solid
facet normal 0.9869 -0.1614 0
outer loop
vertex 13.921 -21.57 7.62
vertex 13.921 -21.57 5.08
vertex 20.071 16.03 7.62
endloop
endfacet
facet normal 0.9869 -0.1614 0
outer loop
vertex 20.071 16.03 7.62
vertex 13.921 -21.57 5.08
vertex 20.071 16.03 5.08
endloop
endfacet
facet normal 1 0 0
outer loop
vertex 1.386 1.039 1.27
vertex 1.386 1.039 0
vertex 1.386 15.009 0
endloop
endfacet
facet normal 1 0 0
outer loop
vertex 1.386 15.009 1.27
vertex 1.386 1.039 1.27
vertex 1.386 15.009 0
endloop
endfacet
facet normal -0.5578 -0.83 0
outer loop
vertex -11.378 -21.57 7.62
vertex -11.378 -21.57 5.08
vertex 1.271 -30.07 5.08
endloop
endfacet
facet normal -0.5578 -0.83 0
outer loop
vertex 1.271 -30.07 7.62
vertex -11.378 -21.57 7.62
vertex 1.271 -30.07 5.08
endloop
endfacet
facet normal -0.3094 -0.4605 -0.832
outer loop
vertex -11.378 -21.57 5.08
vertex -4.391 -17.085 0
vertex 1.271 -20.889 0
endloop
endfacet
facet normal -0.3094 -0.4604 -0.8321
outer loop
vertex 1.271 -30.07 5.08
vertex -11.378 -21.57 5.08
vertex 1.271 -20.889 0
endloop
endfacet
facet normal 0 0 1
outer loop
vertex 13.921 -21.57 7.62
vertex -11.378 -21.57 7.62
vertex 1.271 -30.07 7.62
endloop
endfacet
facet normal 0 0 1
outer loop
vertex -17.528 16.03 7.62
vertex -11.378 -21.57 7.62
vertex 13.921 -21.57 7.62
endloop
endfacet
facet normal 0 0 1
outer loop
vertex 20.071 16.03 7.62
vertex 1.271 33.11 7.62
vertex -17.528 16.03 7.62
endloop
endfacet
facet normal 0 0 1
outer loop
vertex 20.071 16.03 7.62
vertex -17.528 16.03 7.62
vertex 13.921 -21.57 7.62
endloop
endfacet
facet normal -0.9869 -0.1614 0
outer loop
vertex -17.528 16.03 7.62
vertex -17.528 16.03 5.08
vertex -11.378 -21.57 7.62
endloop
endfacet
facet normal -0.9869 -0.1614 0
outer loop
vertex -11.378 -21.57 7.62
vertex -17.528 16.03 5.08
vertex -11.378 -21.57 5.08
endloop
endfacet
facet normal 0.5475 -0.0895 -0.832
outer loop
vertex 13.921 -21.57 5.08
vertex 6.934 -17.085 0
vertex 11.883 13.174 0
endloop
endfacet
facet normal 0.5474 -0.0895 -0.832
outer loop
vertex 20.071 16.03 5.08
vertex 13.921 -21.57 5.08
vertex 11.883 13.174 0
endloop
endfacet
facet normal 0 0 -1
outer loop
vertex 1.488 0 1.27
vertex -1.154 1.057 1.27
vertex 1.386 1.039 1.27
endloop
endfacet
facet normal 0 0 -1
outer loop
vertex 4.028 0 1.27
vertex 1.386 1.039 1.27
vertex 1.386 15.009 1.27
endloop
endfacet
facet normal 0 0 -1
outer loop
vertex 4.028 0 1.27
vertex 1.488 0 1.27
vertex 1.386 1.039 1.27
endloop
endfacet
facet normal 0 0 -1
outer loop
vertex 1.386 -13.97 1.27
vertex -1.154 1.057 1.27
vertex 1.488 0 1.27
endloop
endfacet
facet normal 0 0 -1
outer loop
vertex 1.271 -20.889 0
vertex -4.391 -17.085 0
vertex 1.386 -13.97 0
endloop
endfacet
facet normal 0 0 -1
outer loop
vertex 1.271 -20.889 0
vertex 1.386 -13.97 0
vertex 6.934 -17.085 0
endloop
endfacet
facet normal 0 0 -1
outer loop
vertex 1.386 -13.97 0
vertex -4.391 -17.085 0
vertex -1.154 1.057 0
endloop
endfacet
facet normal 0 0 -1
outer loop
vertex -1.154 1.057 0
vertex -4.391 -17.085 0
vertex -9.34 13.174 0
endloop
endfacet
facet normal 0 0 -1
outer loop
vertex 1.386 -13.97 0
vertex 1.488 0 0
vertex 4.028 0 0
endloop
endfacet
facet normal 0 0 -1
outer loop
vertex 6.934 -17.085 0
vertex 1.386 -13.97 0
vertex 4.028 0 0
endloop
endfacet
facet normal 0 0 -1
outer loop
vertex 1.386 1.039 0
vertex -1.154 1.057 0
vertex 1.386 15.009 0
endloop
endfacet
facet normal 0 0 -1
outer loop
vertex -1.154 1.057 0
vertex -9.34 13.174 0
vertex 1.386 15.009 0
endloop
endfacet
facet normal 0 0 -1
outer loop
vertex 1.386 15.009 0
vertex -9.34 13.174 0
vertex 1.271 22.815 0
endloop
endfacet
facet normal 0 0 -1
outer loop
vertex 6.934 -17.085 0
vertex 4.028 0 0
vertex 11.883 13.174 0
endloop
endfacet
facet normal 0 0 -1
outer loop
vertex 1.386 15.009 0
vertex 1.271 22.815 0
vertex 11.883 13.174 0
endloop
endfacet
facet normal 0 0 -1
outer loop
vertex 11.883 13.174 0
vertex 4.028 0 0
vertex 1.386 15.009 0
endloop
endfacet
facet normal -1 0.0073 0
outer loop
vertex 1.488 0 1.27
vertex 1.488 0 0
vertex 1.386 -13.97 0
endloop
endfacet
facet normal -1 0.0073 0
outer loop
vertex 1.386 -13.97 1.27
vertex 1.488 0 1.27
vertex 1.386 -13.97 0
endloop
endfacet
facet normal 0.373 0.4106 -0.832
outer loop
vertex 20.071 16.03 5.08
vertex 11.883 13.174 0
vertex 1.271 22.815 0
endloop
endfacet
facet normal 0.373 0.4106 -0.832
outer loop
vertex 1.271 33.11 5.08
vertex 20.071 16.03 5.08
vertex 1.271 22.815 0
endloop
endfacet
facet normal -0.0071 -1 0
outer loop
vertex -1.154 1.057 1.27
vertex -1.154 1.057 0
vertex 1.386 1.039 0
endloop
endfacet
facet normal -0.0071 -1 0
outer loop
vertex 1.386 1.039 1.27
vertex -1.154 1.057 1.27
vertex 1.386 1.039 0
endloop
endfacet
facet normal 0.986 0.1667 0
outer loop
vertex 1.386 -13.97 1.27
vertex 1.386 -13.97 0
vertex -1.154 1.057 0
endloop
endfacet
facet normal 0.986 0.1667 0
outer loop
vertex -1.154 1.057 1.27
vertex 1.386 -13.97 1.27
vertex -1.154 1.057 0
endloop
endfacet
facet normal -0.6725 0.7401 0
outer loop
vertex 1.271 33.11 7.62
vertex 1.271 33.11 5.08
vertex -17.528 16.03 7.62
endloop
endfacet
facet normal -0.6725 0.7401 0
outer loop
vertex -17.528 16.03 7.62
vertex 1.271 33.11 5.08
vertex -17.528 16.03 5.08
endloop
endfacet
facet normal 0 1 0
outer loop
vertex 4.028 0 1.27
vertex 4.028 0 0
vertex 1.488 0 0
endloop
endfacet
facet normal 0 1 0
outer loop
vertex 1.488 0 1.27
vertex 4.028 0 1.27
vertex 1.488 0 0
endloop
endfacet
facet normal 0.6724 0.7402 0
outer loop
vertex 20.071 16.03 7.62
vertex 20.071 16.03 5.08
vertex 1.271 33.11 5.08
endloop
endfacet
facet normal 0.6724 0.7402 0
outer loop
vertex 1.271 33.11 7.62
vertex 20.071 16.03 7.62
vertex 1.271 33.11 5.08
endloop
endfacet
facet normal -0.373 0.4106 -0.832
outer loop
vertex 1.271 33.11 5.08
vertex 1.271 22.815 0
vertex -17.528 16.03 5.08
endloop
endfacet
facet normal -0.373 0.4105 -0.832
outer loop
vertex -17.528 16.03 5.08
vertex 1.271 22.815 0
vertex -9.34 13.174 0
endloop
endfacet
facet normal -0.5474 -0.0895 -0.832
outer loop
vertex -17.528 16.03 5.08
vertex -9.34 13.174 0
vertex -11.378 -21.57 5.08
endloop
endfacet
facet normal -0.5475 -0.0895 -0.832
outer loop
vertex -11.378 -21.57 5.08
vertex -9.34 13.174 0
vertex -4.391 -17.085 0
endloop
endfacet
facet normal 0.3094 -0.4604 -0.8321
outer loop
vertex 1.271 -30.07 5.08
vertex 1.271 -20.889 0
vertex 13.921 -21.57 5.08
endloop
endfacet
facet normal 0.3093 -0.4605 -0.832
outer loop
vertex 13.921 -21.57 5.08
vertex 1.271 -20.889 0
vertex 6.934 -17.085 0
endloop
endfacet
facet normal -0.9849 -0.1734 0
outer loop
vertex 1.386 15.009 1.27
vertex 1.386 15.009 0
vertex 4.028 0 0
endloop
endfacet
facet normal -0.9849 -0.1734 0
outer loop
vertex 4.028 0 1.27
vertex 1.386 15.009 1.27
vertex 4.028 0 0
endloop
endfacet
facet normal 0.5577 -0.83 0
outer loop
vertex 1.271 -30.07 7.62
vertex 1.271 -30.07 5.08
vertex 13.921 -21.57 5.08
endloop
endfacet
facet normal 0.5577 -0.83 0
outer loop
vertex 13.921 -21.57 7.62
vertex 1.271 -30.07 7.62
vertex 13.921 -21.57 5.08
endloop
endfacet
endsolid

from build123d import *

# Parameters (mm, degrees)
F0_W     = 17.78
F0_H     = 31.9431498042
F1_DEPTH = 7.62
F2_SIZE2 = 7.62
F2_SIZE  = 5.08
F4_DEPTH = 1.27


with BuildPart() as f1:
    # F0 (on Top) → F1 (new body)
    with BuildSketch(Plane.XY):
        with Locations((1.2714529847, -2.1828604469)):
            Rectangle(F0_W, F0_H)
        Polygon((20.0711702637, 16.0299425669), (10.1614529847, 13.7887144552), (10.1614529847, -18.154435349), (13.9213964405, -21.5704601161), align=None)
        Polygon((-7.6185470153, -18.154435349), (-7.6185470153, 13.7887144552), (-17.5282642944, 16.0299425669), (-11.3784904712, -21.5704601161), align=None)
        Polygon((10.1614529847, -18.154435349), (-7.6185470153, -18.154435349), (-11.3784904712, -21.5704601161), (1.2714529847, -30.0696677594), (13.9213964405, -21.5704601161), align=None)
        Polygon((-17.5282642944, 16.0299425669), (-7.6185470153, 13.7887144552), (10.1614529847, 13.7887144552), (20.0711702637, 16.0299425669), (1.2714529847, 33.1100664022), align=None)
    extrude(amount=F1_DEPTH)

    # F2
    f2_edges = [f1.edges().sort_by_distance(p)[0] for p in [
        (-14.453377, -2.770259, 0),
        (-5.053519, -25.820064, 0),
        (7.596425, -25.820064, 0),
        (16.996283, -2.770259, 0),
        (10.671312, 24.570004, 0),
        (-8.128406, 24.570004, 0),
    ]]
    chamfer(f2_edges, length=F2_SIZE, length2=F2_SIZE2)

    # F3 (on face) → F4 (cut)
    with BuildSketch(Plane(origin=(0, 0, 0), x_dir=(1, 0, 0), z_dir=(0, 0, -1))):
        Polygon((1.3861381407, -1.0392206757), (1.3861381407, -15.0092206757), (4.0282764242, 0), (1.4882764242, 0), (1.3861381407, 13.9696266153), (-1.1537980354, -1.0572268218), align=None)
    extrude(amount=-F4_DEPTH, mode=Mode.SUBTRACT)


solid = f1.part
